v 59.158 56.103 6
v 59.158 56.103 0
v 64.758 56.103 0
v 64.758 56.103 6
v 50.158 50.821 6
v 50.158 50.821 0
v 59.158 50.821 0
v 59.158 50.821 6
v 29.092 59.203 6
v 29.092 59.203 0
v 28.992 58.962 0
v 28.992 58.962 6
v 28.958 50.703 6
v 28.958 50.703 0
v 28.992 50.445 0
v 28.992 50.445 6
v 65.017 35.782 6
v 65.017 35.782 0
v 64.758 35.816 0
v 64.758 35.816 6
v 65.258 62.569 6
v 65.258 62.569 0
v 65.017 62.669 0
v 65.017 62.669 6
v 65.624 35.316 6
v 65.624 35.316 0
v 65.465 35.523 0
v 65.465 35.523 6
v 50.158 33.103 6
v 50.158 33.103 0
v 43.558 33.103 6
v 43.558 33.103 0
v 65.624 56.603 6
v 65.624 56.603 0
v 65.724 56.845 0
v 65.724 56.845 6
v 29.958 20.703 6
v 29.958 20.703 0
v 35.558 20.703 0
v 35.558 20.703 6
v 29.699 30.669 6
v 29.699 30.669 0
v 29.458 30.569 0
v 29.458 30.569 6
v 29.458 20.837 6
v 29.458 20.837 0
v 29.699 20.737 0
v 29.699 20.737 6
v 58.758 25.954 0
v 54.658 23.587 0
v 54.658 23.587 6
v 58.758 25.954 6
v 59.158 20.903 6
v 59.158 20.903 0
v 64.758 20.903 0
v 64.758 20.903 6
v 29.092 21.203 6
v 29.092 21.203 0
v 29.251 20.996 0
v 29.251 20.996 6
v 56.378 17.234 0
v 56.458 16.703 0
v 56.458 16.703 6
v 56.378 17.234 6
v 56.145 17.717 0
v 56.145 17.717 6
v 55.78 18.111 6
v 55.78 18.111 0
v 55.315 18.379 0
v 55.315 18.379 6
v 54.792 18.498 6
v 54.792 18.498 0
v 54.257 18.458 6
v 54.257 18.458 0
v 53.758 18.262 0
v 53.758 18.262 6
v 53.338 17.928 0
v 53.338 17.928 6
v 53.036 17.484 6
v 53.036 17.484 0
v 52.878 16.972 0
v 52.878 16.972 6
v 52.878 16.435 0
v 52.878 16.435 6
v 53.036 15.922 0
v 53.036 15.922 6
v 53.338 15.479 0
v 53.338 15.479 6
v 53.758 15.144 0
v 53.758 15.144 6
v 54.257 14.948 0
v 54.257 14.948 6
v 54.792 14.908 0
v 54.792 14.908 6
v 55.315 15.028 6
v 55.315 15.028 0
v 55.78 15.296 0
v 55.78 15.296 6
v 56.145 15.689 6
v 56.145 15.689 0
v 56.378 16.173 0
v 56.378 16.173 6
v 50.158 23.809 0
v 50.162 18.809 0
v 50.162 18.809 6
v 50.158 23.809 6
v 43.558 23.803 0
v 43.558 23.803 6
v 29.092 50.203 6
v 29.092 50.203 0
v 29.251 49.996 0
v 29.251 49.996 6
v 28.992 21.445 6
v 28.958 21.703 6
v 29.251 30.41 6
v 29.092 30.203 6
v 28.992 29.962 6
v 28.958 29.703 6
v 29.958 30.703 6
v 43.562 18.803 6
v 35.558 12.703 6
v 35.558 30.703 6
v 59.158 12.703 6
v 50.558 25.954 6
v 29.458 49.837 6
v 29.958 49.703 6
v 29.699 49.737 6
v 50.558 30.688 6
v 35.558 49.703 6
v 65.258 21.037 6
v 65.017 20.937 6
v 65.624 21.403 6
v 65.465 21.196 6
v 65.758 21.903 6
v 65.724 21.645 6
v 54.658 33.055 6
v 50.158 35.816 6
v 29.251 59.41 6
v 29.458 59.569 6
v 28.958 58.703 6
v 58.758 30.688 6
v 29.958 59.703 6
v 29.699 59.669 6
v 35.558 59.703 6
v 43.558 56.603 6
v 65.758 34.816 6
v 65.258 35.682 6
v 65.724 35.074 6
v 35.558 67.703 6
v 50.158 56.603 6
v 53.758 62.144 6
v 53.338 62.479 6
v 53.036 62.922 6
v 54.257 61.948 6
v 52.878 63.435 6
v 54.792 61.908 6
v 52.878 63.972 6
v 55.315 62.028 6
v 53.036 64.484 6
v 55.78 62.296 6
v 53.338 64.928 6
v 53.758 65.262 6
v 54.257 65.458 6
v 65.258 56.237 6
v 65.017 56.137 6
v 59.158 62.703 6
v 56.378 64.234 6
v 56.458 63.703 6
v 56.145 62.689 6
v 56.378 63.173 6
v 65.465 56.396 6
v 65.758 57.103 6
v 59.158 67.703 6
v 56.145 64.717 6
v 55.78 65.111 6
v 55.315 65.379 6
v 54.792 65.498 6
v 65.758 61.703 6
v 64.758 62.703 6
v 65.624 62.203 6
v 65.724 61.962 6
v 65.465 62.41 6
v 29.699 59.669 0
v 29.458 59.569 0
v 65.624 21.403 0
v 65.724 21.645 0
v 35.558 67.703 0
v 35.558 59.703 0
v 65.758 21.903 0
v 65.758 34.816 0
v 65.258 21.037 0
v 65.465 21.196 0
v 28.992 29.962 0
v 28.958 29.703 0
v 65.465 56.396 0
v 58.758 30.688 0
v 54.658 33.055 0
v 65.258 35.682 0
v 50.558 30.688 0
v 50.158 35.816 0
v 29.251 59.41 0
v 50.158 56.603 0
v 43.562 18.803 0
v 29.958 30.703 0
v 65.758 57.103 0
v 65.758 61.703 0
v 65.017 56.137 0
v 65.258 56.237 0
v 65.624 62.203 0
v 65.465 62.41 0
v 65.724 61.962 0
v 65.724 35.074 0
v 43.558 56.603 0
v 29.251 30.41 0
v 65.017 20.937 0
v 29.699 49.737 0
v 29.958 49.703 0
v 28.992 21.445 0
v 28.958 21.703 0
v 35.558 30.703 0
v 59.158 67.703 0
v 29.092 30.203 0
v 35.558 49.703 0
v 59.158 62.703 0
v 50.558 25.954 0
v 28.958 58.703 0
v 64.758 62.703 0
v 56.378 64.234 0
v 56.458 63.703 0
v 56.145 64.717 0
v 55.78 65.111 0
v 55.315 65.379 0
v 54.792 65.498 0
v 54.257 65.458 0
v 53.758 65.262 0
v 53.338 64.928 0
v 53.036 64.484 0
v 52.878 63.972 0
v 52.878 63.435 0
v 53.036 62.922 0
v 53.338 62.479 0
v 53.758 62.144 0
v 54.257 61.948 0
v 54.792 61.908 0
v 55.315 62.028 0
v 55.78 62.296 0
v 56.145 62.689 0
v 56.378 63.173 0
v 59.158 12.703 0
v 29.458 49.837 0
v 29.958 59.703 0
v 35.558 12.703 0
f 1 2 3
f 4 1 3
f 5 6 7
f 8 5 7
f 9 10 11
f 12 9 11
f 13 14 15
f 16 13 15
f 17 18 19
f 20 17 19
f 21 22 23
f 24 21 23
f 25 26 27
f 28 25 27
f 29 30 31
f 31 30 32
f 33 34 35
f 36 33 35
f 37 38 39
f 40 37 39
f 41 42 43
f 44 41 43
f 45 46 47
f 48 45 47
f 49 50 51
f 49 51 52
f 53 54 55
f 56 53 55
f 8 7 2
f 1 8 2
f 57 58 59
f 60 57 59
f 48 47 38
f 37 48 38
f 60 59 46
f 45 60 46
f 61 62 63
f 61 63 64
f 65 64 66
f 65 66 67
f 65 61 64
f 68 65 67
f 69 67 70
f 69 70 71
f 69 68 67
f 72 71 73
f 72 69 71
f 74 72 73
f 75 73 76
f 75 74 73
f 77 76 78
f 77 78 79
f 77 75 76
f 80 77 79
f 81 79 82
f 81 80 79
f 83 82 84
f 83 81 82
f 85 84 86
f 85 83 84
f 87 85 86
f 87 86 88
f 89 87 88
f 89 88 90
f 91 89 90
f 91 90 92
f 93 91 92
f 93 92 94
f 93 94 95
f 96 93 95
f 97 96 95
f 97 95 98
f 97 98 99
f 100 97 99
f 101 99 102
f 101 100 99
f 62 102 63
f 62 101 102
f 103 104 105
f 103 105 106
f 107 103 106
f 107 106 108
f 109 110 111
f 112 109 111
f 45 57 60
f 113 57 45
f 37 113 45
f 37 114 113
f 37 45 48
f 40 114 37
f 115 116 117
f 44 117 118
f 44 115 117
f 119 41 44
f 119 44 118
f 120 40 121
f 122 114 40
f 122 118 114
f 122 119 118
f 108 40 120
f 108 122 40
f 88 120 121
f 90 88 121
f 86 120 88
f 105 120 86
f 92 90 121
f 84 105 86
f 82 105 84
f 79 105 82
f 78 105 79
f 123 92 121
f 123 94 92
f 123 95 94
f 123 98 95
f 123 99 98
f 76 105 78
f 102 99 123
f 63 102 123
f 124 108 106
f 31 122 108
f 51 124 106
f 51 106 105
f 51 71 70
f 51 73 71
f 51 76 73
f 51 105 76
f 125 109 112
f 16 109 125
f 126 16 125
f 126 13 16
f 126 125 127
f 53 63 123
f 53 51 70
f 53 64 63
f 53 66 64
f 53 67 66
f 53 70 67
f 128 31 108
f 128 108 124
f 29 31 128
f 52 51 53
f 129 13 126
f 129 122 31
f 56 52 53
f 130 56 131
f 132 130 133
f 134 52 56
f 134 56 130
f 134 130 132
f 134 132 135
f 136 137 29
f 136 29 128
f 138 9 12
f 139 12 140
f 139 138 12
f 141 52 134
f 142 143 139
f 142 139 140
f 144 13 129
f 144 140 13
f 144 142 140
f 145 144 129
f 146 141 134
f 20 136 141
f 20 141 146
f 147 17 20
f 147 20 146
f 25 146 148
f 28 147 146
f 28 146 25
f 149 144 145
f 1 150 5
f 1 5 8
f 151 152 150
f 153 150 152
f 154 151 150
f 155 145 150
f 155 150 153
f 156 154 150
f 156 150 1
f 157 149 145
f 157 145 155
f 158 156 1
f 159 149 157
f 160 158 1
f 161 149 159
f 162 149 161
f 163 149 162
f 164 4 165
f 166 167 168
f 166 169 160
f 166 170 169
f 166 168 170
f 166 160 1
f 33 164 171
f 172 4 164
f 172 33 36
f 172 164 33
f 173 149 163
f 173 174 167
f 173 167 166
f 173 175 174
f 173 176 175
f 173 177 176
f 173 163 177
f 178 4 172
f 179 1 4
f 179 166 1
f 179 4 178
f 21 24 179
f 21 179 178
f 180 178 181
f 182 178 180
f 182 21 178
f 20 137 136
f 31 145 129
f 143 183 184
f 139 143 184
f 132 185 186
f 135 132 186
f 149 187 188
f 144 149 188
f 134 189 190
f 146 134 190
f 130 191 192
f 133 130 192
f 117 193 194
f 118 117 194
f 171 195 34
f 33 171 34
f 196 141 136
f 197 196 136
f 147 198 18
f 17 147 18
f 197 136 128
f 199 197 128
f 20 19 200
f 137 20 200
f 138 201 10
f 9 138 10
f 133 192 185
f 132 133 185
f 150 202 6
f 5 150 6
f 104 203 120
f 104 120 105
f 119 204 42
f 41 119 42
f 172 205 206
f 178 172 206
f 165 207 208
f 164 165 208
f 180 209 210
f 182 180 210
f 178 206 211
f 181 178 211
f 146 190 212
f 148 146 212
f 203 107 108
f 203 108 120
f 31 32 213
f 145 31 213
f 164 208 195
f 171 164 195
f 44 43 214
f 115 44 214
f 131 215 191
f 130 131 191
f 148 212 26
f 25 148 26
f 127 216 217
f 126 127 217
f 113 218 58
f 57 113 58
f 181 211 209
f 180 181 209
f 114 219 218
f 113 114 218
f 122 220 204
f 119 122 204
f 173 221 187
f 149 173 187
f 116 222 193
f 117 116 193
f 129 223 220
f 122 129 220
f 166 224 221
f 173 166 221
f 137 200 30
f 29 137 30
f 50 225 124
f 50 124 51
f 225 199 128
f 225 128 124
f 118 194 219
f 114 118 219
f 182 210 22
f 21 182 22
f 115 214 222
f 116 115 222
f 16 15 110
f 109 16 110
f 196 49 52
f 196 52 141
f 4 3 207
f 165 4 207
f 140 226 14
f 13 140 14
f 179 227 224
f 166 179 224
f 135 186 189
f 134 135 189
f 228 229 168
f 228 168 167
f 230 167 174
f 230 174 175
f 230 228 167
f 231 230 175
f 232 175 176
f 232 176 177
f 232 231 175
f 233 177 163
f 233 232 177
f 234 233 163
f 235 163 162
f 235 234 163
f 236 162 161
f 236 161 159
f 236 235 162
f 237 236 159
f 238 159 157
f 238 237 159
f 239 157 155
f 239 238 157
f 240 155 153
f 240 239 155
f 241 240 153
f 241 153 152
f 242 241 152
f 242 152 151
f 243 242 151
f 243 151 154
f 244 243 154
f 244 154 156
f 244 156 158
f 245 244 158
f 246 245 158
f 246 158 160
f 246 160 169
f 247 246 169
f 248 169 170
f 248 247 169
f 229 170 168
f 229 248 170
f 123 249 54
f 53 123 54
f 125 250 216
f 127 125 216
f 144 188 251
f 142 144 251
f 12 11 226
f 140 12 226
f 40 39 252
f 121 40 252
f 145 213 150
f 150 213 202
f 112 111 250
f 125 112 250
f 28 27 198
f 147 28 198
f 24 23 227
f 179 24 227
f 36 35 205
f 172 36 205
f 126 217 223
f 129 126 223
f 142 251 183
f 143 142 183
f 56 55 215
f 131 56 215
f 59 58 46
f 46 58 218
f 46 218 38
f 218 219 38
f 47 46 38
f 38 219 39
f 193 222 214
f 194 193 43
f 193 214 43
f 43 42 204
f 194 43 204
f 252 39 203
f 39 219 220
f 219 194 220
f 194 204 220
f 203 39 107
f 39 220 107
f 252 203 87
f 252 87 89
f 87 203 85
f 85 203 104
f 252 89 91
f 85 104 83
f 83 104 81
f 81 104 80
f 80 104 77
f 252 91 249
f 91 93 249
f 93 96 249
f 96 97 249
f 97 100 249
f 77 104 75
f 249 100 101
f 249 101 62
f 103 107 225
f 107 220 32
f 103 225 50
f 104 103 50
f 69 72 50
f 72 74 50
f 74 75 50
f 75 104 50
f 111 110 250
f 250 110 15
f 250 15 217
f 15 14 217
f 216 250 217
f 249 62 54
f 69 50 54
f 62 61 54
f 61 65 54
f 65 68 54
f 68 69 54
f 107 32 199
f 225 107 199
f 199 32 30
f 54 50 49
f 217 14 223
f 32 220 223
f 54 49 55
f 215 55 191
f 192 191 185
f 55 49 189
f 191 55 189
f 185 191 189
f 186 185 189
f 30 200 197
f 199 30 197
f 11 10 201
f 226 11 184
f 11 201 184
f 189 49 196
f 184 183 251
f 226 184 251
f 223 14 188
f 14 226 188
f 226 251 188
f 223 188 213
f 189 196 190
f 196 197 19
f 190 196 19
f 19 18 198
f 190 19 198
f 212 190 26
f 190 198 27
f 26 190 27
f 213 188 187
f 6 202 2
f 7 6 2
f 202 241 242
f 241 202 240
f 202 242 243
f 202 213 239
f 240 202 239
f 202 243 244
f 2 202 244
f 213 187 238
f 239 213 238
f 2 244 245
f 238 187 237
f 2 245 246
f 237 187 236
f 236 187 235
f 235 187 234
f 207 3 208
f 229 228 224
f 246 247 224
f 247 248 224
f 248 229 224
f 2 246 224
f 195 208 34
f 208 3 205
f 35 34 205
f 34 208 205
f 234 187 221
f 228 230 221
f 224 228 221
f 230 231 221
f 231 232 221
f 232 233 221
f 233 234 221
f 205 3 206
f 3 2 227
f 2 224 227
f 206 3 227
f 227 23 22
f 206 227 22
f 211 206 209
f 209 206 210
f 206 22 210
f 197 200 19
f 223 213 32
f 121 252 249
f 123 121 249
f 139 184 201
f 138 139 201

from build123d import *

# Parameters (mm, degrees)
MODEL_R                  = 1.8
RESSALTO_EXTRUS_O1_DEPTH = 6


with BuildPart() as part:
    # Model → Ressalto-extrusão1 (new body)
    with BuildSketch(Plane.XY):
        Polygon((65.723755116, 35.074422304), (65.623854693, 35.315603259), (65.46493607, 35.52271004), (65.257829289, 35.681628662), (65.016648334, 35.781529085), (64.757829289, 35.815603259), (50.157829289, 35.815603259), (50.157829289, 33.103327835), (43.557829289, 33.103327835), (43.557829289, 56.603327835), (50.157829289, 56.603327835), (50.157829289, 50.820791423), (59.157829289, 50.820791423), (59.157829289, 56.103327835), (64.757829289, 56.103327835), (65.016648334, 56.137402008), (65.257829289, 56.237302431), (65.46493607, 56.396221053), (65.623854693, 56.603327835), (65.723755116, 56.844508789), (65.757829289, 57.103327835), (65.757829289, 61.703327835), (65.723755116, 61.96214688), (65.623854693, 62.203327835), (65.46493607, 62.410434616), (65.257829289, 62.569353238), (65.016648334, 62.669253661), (64.757829289, 62.703327835), (59.157829289, 62.703327835), (59.157829289, 67.703327835), (35.557829289, 67.703327835), (35.557829289, 59.703327835), (29.957829289, 59.703327835), (29.699010244, 59.669253661), (29.457829289, 59.569353238), (29.250722508, 59.410434616), (29.091803885, 59.203327835), (28.991903463, 58.96214688), (28.957829289, 58.703327835), (28.957829289, 50.703327835), (28.991903463, 50.444508789), (29.091803885, 50.203327835), (29.250722508, 49.996221053), (29.457829289, 49.837302431), (29.699010244, 49.737402008), (29.957829289, 49.703327835), (35.557829289, 49.703327835), (35.557829289, 30.703327835), (29.957829289, 30.703327835), (29.699010244, 30.669253661), (29.457829289, 30.569353238), (29.250722508, 30.410434616), (29.091803885, 30.203327835), (28.991903463, 29.96214688), (28.957829289, 29.703327835), (28.957829289, 21.703327835), (28.991903463, 21.444508789), (29.091803885, 21.203327835), (29.250722508, 20.996221053), (29.457829289, 20.837302431), (29.699010244, 20.737402008), (29.957829289, 20.703327835), (35.557829289, 20.703327835), (35.557829289, 12.703327835), (59.157829289, 12.703327835), (59.157829289, 20.903327835), (64.757829289, 20.903327835), (65.016648334, 20.937402008), (65.257829289, 21.037302431), (65.46493607, 21.196221053), (65.623854693, 21.403327835), (65.723755116, 21.644508789), (65.757829289, 21.903327835), (65.757829289, 34.815603259), align=None)
        with Locations((54.657829289, 63.703327835)):
            Circle(MODEL_R, mode=Mode.SUBTRACT)
        with Locations((54.657829289, 16.703327835)):
            Circle(MODEL_R, mode=Mode.SUBTRACT)
        Polygon((43.557829289, 23.803327835), (43.561764571, 18.803329383), (50.161762529, 18.808521259), (50.157829289, 23.808519712), align=None, mode=Mode.SUBTRACT)
        Polygon((50.557829289, 30.687927527), (50.557829289, 25.95365532), (54.657829289, 23.586519216), (58.757829289, 25.95365532), (58.757829289, 30.687927527), (54.657829289, 33.055063631), align=None, mode=Mode.SUBTRACT)
    extrude(amount=RESSALTO_EXTRUS_O1_DEPTH)


solid = part.part
